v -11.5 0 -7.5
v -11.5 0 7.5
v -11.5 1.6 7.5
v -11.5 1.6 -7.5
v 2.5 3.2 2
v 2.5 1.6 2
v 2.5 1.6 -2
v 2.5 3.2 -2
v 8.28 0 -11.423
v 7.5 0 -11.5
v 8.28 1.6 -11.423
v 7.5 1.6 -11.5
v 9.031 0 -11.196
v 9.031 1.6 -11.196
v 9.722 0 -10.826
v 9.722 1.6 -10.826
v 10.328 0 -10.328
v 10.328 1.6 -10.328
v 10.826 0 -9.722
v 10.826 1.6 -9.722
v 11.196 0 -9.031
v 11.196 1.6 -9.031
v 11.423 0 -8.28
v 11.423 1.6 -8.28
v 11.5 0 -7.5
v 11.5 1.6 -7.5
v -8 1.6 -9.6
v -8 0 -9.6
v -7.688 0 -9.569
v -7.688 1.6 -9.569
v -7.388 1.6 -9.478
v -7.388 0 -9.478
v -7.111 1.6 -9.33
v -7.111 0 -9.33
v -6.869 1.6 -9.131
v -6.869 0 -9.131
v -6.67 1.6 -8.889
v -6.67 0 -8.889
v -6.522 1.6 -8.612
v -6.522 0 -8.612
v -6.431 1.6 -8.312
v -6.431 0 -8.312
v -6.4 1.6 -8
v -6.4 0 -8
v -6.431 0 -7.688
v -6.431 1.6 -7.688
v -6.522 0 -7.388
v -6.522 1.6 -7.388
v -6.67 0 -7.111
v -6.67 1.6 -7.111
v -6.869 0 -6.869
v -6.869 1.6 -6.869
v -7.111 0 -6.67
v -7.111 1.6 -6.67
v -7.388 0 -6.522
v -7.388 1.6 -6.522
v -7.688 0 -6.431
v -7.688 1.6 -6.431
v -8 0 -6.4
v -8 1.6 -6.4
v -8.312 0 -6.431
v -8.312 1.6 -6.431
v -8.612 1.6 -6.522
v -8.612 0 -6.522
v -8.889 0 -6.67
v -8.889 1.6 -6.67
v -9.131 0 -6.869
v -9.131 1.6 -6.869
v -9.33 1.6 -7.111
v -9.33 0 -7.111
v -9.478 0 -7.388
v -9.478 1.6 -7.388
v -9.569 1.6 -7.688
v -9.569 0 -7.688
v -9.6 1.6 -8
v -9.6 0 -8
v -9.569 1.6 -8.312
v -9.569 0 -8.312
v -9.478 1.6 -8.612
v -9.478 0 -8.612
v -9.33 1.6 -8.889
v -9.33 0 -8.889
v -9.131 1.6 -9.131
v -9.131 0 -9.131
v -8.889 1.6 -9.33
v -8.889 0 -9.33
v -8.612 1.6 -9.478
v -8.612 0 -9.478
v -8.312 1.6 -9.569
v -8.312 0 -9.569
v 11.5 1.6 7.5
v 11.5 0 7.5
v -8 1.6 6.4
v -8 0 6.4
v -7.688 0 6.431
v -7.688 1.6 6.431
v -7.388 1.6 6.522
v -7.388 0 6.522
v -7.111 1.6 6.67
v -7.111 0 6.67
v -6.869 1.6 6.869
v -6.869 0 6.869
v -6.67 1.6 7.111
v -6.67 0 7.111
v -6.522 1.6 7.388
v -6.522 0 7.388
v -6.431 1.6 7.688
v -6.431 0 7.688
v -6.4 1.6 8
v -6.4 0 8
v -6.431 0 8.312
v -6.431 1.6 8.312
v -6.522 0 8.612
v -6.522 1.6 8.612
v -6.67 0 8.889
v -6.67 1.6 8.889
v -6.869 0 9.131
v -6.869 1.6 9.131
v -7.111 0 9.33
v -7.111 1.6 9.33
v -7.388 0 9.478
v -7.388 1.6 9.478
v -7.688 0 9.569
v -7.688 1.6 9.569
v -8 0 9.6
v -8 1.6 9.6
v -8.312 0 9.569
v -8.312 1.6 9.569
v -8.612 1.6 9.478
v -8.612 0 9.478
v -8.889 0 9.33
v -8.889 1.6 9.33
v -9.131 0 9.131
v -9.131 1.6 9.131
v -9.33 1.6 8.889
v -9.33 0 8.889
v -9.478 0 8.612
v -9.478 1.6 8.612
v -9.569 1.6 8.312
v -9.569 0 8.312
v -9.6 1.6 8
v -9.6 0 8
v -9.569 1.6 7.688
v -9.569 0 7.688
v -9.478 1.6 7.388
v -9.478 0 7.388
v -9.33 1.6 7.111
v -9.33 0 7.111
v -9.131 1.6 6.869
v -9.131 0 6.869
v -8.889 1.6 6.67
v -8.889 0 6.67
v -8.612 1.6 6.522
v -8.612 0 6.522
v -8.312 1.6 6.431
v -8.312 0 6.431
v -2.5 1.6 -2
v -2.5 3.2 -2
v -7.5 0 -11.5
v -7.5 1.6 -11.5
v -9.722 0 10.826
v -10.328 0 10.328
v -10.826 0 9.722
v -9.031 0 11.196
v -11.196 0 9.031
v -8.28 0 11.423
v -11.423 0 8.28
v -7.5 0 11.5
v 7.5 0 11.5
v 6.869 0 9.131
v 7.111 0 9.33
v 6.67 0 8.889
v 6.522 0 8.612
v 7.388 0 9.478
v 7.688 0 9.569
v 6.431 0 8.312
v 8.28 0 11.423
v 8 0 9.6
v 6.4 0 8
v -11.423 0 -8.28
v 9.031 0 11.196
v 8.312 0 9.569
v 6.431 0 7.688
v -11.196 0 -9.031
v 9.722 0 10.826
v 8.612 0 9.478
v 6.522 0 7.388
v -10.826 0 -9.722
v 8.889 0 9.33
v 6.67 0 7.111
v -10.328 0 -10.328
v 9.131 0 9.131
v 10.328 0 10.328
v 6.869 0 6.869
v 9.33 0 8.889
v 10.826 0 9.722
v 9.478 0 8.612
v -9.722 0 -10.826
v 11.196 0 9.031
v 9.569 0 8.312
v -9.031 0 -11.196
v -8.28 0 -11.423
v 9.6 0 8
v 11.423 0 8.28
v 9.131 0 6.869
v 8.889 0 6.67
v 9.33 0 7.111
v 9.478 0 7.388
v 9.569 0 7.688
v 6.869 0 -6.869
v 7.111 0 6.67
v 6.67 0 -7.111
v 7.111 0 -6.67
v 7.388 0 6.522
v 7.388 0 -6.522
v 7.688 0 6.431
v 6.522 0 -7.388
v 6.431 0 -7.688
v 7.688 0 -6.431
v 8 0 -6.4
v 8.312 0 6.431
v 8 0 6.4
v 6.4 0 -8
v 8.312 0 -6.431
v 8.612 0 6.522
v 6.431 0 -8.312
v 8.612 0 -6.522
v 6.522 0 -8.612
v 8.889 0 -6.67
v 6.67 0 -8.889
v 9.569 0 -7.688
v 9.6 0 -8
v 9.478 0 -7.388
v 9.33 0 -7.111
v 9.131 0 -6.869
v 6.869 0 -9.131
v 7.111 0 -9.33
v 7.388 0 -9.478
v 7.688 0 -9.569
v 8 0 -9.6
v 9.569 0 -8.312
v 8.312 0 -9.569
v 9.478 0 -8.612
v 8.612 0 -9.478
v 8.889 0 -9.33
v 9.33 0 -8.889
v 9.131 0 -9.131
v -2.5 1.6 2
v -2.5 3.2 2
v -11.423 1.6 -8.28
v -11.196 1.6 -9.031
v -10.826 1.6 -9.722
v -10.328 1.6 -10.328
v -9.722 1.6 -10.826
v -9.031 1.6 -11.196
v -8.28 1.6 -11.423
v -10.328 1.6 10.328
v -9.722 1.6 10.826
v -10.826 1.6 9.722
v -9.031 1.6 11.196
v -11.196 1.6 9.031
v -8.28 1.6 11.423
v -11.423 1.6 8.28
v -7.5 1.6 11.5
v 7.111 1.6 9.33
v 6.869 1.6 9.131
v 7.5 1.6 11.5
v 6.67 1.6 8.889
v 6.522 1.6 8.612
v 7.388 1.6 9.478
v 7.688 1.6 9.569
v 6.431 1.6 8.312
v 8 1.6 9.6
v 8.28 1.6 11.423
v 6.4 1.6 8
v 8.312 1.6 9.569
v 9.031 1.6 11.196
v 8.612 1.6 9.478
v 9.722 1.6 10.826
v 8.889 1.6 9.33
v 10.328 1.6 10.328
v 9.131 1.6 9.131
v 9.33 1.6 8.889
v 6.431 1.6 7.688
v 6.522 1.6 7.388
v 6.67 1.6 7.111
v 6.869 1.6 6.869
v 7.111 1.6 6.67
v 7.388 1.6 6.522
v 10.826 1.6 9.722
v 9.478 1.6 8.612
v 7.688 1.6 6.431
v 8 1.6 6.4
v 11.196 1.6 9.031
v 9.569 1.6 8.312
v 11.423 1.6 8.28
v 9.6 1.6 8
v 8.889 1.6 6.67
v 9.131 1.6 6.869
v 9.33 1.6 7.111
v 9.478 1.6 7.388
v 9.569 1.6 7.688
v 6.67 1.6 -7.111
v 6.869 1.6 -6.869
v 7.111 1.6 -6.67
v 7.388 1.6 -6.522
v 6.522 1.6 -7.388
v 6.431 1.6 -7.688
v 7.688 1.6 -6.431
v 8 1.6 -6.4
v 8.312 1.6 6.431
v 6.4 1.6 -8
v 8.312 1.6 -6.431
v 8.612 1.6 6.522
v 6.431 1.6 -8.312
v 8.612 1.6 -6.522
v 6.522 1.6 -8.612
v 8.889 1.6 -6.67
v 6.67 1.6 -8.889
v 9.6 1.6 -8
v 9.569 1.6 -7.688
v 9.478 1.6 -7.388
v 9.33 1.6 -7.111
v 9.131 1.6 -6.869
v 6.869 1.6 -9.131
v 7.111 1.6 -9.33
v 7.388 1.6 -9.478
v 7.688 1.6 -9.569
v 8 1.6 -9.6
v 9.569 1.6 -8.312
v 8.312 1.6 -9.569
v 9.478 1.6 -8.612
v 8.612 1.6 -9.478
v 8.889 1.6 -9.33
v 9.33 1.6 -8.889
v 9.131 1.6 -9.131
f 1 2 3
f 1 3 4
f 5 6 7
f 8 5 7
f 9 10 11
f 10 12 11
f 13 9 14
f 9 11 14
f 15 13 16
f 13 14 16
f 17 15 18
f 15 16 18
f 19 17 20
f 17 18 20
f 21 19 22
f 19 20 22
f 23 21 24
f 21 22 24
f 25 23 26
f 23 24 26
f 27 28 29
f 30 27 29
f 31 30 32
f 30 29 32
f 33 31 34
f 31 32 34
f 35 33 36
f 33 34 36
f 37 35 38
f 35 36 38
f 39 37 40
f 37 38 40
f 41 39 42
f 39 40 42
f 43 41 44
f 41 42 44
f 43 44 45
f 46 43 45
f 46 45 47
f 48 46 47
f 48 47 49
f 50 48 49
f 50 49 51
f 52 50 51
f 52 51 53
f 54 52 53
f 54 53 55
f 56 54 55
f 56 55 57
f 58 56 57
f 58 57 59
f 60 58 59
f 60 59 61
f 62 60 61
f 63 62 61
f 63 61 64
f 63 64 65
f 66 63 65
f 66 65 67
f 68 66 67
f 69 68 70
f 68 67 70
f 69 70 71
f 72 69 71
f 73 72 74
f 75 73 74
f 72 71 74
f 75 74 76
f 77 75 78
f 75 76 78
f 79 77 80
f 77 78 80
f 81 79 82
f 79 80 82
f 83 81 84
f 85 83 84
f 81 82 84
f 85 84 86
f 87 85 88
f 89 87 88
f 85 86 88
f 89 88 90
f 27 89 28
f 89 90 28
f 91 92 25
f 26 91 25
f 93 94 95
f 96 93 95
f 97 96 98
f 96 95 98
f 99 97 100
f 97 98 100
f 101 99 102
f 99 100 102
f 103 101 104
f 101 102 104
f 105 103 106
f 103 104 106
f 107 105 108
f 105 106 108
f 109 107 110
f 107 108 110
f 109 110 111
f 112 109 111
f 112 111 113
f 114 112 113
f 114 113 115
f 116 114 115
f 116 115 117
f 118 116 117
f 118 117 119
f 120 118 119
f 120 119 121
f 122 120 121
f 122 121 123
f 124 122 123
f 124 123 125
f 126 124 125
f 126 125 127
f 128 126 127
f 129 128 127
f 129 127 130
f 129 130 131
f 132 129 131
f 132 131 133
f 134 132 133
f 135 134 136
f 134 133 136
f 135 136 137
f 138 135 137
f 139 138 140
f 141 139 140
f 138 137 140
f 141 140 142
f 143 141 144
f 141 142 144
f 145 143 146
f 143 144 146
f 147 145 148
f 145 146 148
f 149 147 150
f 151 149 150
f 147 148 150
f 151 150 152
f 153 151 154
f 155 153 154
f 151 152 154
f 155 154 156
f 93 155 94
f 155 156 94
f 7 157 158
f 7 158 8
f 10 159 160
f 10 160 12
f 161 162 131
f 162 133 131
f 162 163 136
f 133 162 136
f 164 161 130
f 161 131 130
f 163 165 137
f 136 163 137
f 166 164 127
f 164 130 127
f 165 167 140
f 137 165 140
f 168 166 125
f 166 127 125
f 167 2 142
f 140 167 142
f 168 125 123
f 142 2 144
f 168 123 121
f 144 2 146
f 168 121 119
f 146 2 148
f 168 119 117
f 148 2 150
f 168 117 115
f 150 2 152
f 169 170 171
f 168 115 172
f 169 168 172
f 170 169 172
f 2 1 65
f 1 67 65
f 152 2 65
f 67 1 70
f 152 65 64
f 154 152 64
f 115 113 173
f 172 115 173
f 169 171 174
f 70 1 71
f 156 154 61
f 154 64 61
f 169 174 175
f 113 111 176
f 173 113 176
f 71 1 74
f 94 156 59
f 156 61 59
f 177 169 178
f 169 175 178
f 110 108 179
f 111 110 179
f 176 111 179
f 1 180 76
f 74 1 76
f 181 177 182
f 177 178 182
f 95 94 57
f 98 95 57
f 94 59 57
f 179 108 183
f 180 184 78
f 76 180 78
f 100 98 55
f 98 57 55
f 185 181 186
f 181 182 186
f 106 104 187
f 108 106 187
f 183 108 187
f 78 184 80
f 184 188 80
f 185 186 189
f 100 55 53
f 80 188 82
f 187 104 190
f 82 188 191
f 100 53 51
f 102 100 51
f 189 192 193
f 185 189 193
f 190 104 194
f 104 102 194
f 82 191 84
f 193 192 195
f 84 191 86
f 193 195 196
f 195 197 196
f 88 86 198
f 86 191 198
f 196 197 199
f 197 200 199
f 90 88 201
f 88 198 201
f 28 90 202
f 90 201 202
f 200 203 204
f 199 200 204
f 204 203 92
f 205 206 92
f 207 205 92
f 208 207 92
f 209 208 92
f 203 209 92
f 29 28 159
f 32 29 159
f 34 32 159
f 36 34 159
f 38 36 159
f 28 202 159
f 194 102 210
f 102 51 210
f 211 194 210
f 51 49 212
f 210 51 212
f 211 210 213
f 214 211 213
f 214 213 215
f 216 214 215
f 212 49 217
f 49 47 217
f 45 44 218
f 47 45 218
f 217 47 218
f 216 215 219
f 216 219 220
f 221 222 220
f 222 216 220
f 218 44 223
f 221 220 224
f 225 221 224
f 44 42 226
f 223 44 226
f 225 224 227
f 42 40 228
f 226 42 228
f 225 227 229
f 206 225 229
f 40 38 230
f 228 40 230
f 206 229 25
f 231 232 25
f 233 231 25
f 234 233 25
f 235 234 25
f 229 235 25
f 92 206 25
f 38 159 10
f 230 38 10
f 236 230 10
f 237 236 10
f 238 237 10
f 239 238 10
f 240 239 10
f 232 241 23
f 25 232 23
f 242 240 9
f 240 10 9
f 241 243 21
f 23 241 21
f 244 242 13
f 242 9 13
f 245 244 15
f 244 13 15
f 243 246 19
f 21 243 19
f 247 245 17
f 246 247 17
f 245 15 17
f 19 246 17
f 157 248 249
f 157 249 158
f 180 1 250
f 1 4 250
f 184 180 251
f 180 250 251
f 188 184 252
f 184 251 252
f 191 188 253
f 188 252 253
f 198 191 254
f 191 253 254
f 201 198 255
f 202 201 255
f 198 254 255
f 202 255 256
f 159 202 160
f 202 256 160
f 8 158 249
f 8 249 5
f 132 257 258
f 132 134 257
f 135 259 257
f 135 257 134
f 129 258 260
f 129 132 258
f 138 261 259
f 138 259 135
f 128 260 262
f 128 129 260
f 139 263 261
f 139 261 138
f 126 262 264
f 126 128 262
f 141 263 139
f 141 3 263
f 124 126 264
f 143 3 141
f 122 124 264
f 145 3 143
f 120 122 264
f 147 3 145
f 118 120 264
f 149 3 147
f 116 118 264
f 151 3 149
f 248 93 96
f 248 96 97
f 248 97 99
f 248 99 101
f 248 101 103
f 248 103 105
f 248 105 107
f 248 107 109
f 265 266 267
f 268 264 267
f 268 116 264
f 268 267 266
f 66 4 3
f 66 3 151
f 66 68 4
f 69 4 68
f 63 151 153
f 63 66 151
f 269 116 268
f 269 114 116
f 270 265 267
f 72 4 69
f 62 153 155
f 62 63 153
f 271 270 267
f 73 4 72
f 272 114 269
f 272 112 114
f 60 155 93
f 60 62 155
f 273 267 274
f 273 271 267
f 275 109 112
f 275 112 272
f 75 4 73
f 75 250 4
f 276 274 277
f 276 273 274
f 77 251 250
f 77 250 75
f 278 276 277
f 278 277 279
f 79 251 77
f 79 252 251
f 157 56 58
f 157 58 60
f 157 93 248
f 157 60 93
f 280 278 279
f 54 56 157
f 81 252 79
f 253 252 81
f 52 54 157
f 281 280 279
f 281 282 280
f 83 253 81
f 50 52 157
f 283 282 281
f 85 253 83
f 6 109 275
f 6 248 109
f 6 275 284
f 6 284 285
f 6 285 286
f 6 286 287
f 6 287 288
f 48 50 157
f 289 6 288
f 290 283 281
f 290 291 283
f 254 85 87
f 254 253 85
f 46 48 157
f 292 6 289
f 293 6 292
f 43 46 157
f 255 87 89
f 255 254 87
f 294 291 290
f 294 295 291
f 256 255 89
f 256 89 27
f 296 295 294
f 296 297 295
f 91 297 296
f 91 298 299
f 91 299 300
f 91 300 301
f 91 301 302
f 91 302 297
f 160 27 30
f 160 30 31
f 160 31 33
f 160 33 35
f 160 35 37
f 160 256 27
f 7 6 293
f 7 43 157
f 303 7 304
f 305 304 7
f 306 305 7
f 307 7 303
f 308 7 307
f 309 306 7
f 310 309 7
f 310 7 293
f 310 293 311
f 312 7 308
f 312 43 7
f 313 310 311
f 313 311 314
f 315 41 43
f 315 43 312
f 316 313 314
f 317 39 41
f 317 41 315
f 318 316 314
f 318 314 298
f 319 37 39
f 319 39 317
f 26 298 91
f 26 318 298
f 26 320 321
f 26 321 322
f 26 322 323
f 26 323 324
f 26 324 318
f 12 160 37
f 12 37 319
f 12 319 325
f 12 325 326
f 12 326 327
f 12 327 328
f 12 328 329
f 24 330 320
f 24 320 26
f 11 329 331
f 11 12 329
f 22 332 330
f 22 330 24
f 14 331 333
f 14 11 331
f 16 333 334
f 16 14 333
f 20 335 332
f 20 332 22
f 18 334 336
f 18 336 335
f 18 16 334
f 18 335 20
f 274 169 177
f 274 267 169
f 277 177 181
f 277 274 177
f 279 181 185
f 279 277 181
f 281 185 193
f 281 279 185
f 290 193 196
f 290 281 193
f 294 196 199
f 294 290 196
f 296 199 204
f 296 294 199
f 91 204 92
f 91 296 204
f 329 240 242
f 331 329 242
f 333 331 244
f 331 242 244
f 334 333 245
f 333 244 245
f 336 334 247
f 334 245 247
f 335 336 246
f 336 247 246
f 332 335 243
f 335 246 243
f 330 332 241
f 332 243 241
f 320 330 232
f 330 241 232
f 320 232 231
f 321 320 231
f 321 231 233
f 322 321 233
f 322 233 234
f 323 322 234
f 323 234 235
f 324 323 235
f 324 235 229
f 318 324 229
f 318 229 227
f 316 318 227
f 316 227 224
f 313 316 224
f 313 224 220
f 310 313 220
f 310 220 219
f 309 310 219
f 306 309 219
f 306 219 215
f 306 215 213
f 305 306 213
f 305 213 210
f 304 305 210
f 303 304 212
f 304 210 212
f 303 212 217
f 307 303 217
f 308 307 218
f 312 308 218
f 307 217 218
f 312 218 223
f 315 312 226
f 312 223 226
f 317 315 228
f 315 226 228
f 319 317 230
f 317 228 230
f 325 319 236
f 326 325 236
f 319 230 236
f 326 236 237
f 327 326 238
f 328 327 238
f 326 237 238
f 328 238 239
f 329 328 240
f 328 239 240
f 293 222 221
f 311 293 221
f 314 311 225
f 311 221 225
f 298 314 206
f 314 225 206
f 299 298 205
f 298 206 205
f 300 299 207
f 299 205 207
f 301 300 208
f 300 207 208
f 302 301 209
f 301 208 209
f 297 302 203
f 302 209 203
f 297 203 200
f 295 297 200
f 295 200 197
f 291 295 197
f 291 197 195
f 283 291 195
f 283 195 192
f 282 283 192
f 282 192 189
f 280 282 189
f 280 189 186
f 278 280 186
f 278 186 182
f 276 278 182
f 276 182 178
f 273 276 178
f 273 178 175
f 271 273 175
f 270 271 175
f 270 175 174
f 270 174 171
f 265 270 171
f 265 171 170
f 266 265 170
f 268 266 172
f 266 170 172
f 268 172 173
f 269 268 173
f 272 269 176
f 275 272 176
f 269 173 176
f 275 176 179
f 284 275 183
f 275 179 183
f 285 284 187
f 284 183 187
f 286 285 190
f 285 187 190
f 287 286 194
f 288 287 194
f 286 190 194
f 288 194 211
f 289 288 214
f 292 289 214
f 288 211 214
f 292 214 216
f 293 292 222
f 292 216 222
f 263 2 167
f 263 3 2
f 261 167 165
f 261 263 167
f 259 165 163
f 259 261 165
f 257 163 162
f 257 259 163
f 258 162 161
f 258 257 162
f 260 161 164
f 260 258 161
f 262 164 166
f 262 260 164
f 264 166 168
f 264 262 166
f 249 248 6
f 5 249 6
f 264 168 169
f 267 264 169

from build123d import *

# Parameters (mm, degrees)
SKETCH_1_W          = 23
SKETCH_1_H          = 23
EXTRUDE_1_DEPTH     = 1.6
SKETCH_2_W          = 5
SKETCH_2_H          = 4
EXTRUDE_2_DEPTH     = 1.6
FILLET_1_R          = 4
CUT_EXTRUDE_1_REACH = 18.575
SKETCH_3_R          = 1.6


with BuildPart() as part:
    # 草图1 → 凸台-拉伸1 (new body)
    with BuildSketch(Plane(origin=(0, 0, 0), x_dir=(1, 0, 0), z_dir=(0, 1, 0))):
        Rectangle(SKETCH_1_W, SKETCH_1_H)
    extrude(amount=EXTRUDE_1_DEPTH)

    # 草图2 → 凸台-拉伸2 (add)
    with BuildSketch(Plane(origin=(0, 1.6, 0), x_dir=(1, 0, 0), z_dir=(0, 1, 0))):
        Rectangle(SKETCH_2_W, SKETCH_2_H)
    extrude(amount=EXTRUDE_2_DEPTH)

    # 圆角1
    fillet_1_edges = [part.edges().sort_by_distance(p)[0] for p in [
        (11.5, 0.8, 11.5),
        (-11.5, 0.8, 11.5),
        (-11.5, 0.8, -11.5),
        (11.5, 0.8, -11.5),
    ]]
    fillet(fillet_1_edges, radius=FILLET_1_R)

    # 草图3 → 切除-拉伸1 (cut, up to next)
    with BuildSketch(Plane.XZ, mode=Mode.PRIVATE) as cut_extrude_1_sk1:
        with Locations(Location((-8, 8, 0), (0, 0, 270))):
            Circle(SKETCH_3_R)
    cut_extrude_1_tool1 = extrude(cut_extrude_1_sk1.sketch, amount=-CUT_EXTRUDE_1_REACH, mode=Mode.PRIVATE) & part.part
    # 草图3 → 切除-拉伸1 (cut, up to next)
    with BuildSketch(Plane.XZ, mode=Mode.PRIVATE) as cut_extrude_1_sk2:
        with Locations(Location((8, 8, 0), (0, 0, 270))):
            Circle(SKETCH_3_R)
    cut_extrude_1_tool2 = extrude(cut_extrude_1_sk2.sketch, amount=-CUT_EXTRUDE_1_REACH, mode=Mode.PRIVATE) & part.part
    # 草图3 → 切除-拉伸1 (cut, up to next)
    with BuildSketch(Plane.XZ, mode=Mode.PRIVATE) as cut_extrude_1_sk3:
        with Locations(Location((8, -8, 0), (0, 0, 270))):
            Circle(SKETCH_3_R)
    cut_extrude_1_tool3 = extrude(cut_extrude_1_sk3.sketch, amount=-CUT_EXTRUDE_1_REACH, mode=Mode.PRIVATE) & part.part
    # 草图3 → 切除-拉伸1 (cut, up to next)
    with BuildSketch(Plane.XZ, mode=Mode.PRIVATE) as cut_extrude_1_sk4:
        with Locations(Location((-8, -8, 0), (0, 0, 270))):
            Circle(SKETCH_3_R)
    cut_extrude_1_tool4 = extrude(cut_extrude_1_sk4.sketch, amount=-CUT_EXTRUDE_1_REACH, mode=Mode.PRIVATE) & part.part
    add(cut_extrude_1_tool1.solids().sort_by_distance((-8, 0, 8))[0], mode=Mode.SUBTRACT)
    add(cut_extrude_1_tool2.solids().sort_by_distance((8, 0, 8))[0], mode=Mode.SUBTRACT)
    add(cut_extrude_1_tool3.solids().sort_by_distance((8, 0, -8))[0], mode=Mode.SUBTRACT)
    add(cut_extrude_1_tool4.solids().sort_by_distance((-8, 0, -8))[0], mode=Mode.SUBTRACT)


solid = part.part
